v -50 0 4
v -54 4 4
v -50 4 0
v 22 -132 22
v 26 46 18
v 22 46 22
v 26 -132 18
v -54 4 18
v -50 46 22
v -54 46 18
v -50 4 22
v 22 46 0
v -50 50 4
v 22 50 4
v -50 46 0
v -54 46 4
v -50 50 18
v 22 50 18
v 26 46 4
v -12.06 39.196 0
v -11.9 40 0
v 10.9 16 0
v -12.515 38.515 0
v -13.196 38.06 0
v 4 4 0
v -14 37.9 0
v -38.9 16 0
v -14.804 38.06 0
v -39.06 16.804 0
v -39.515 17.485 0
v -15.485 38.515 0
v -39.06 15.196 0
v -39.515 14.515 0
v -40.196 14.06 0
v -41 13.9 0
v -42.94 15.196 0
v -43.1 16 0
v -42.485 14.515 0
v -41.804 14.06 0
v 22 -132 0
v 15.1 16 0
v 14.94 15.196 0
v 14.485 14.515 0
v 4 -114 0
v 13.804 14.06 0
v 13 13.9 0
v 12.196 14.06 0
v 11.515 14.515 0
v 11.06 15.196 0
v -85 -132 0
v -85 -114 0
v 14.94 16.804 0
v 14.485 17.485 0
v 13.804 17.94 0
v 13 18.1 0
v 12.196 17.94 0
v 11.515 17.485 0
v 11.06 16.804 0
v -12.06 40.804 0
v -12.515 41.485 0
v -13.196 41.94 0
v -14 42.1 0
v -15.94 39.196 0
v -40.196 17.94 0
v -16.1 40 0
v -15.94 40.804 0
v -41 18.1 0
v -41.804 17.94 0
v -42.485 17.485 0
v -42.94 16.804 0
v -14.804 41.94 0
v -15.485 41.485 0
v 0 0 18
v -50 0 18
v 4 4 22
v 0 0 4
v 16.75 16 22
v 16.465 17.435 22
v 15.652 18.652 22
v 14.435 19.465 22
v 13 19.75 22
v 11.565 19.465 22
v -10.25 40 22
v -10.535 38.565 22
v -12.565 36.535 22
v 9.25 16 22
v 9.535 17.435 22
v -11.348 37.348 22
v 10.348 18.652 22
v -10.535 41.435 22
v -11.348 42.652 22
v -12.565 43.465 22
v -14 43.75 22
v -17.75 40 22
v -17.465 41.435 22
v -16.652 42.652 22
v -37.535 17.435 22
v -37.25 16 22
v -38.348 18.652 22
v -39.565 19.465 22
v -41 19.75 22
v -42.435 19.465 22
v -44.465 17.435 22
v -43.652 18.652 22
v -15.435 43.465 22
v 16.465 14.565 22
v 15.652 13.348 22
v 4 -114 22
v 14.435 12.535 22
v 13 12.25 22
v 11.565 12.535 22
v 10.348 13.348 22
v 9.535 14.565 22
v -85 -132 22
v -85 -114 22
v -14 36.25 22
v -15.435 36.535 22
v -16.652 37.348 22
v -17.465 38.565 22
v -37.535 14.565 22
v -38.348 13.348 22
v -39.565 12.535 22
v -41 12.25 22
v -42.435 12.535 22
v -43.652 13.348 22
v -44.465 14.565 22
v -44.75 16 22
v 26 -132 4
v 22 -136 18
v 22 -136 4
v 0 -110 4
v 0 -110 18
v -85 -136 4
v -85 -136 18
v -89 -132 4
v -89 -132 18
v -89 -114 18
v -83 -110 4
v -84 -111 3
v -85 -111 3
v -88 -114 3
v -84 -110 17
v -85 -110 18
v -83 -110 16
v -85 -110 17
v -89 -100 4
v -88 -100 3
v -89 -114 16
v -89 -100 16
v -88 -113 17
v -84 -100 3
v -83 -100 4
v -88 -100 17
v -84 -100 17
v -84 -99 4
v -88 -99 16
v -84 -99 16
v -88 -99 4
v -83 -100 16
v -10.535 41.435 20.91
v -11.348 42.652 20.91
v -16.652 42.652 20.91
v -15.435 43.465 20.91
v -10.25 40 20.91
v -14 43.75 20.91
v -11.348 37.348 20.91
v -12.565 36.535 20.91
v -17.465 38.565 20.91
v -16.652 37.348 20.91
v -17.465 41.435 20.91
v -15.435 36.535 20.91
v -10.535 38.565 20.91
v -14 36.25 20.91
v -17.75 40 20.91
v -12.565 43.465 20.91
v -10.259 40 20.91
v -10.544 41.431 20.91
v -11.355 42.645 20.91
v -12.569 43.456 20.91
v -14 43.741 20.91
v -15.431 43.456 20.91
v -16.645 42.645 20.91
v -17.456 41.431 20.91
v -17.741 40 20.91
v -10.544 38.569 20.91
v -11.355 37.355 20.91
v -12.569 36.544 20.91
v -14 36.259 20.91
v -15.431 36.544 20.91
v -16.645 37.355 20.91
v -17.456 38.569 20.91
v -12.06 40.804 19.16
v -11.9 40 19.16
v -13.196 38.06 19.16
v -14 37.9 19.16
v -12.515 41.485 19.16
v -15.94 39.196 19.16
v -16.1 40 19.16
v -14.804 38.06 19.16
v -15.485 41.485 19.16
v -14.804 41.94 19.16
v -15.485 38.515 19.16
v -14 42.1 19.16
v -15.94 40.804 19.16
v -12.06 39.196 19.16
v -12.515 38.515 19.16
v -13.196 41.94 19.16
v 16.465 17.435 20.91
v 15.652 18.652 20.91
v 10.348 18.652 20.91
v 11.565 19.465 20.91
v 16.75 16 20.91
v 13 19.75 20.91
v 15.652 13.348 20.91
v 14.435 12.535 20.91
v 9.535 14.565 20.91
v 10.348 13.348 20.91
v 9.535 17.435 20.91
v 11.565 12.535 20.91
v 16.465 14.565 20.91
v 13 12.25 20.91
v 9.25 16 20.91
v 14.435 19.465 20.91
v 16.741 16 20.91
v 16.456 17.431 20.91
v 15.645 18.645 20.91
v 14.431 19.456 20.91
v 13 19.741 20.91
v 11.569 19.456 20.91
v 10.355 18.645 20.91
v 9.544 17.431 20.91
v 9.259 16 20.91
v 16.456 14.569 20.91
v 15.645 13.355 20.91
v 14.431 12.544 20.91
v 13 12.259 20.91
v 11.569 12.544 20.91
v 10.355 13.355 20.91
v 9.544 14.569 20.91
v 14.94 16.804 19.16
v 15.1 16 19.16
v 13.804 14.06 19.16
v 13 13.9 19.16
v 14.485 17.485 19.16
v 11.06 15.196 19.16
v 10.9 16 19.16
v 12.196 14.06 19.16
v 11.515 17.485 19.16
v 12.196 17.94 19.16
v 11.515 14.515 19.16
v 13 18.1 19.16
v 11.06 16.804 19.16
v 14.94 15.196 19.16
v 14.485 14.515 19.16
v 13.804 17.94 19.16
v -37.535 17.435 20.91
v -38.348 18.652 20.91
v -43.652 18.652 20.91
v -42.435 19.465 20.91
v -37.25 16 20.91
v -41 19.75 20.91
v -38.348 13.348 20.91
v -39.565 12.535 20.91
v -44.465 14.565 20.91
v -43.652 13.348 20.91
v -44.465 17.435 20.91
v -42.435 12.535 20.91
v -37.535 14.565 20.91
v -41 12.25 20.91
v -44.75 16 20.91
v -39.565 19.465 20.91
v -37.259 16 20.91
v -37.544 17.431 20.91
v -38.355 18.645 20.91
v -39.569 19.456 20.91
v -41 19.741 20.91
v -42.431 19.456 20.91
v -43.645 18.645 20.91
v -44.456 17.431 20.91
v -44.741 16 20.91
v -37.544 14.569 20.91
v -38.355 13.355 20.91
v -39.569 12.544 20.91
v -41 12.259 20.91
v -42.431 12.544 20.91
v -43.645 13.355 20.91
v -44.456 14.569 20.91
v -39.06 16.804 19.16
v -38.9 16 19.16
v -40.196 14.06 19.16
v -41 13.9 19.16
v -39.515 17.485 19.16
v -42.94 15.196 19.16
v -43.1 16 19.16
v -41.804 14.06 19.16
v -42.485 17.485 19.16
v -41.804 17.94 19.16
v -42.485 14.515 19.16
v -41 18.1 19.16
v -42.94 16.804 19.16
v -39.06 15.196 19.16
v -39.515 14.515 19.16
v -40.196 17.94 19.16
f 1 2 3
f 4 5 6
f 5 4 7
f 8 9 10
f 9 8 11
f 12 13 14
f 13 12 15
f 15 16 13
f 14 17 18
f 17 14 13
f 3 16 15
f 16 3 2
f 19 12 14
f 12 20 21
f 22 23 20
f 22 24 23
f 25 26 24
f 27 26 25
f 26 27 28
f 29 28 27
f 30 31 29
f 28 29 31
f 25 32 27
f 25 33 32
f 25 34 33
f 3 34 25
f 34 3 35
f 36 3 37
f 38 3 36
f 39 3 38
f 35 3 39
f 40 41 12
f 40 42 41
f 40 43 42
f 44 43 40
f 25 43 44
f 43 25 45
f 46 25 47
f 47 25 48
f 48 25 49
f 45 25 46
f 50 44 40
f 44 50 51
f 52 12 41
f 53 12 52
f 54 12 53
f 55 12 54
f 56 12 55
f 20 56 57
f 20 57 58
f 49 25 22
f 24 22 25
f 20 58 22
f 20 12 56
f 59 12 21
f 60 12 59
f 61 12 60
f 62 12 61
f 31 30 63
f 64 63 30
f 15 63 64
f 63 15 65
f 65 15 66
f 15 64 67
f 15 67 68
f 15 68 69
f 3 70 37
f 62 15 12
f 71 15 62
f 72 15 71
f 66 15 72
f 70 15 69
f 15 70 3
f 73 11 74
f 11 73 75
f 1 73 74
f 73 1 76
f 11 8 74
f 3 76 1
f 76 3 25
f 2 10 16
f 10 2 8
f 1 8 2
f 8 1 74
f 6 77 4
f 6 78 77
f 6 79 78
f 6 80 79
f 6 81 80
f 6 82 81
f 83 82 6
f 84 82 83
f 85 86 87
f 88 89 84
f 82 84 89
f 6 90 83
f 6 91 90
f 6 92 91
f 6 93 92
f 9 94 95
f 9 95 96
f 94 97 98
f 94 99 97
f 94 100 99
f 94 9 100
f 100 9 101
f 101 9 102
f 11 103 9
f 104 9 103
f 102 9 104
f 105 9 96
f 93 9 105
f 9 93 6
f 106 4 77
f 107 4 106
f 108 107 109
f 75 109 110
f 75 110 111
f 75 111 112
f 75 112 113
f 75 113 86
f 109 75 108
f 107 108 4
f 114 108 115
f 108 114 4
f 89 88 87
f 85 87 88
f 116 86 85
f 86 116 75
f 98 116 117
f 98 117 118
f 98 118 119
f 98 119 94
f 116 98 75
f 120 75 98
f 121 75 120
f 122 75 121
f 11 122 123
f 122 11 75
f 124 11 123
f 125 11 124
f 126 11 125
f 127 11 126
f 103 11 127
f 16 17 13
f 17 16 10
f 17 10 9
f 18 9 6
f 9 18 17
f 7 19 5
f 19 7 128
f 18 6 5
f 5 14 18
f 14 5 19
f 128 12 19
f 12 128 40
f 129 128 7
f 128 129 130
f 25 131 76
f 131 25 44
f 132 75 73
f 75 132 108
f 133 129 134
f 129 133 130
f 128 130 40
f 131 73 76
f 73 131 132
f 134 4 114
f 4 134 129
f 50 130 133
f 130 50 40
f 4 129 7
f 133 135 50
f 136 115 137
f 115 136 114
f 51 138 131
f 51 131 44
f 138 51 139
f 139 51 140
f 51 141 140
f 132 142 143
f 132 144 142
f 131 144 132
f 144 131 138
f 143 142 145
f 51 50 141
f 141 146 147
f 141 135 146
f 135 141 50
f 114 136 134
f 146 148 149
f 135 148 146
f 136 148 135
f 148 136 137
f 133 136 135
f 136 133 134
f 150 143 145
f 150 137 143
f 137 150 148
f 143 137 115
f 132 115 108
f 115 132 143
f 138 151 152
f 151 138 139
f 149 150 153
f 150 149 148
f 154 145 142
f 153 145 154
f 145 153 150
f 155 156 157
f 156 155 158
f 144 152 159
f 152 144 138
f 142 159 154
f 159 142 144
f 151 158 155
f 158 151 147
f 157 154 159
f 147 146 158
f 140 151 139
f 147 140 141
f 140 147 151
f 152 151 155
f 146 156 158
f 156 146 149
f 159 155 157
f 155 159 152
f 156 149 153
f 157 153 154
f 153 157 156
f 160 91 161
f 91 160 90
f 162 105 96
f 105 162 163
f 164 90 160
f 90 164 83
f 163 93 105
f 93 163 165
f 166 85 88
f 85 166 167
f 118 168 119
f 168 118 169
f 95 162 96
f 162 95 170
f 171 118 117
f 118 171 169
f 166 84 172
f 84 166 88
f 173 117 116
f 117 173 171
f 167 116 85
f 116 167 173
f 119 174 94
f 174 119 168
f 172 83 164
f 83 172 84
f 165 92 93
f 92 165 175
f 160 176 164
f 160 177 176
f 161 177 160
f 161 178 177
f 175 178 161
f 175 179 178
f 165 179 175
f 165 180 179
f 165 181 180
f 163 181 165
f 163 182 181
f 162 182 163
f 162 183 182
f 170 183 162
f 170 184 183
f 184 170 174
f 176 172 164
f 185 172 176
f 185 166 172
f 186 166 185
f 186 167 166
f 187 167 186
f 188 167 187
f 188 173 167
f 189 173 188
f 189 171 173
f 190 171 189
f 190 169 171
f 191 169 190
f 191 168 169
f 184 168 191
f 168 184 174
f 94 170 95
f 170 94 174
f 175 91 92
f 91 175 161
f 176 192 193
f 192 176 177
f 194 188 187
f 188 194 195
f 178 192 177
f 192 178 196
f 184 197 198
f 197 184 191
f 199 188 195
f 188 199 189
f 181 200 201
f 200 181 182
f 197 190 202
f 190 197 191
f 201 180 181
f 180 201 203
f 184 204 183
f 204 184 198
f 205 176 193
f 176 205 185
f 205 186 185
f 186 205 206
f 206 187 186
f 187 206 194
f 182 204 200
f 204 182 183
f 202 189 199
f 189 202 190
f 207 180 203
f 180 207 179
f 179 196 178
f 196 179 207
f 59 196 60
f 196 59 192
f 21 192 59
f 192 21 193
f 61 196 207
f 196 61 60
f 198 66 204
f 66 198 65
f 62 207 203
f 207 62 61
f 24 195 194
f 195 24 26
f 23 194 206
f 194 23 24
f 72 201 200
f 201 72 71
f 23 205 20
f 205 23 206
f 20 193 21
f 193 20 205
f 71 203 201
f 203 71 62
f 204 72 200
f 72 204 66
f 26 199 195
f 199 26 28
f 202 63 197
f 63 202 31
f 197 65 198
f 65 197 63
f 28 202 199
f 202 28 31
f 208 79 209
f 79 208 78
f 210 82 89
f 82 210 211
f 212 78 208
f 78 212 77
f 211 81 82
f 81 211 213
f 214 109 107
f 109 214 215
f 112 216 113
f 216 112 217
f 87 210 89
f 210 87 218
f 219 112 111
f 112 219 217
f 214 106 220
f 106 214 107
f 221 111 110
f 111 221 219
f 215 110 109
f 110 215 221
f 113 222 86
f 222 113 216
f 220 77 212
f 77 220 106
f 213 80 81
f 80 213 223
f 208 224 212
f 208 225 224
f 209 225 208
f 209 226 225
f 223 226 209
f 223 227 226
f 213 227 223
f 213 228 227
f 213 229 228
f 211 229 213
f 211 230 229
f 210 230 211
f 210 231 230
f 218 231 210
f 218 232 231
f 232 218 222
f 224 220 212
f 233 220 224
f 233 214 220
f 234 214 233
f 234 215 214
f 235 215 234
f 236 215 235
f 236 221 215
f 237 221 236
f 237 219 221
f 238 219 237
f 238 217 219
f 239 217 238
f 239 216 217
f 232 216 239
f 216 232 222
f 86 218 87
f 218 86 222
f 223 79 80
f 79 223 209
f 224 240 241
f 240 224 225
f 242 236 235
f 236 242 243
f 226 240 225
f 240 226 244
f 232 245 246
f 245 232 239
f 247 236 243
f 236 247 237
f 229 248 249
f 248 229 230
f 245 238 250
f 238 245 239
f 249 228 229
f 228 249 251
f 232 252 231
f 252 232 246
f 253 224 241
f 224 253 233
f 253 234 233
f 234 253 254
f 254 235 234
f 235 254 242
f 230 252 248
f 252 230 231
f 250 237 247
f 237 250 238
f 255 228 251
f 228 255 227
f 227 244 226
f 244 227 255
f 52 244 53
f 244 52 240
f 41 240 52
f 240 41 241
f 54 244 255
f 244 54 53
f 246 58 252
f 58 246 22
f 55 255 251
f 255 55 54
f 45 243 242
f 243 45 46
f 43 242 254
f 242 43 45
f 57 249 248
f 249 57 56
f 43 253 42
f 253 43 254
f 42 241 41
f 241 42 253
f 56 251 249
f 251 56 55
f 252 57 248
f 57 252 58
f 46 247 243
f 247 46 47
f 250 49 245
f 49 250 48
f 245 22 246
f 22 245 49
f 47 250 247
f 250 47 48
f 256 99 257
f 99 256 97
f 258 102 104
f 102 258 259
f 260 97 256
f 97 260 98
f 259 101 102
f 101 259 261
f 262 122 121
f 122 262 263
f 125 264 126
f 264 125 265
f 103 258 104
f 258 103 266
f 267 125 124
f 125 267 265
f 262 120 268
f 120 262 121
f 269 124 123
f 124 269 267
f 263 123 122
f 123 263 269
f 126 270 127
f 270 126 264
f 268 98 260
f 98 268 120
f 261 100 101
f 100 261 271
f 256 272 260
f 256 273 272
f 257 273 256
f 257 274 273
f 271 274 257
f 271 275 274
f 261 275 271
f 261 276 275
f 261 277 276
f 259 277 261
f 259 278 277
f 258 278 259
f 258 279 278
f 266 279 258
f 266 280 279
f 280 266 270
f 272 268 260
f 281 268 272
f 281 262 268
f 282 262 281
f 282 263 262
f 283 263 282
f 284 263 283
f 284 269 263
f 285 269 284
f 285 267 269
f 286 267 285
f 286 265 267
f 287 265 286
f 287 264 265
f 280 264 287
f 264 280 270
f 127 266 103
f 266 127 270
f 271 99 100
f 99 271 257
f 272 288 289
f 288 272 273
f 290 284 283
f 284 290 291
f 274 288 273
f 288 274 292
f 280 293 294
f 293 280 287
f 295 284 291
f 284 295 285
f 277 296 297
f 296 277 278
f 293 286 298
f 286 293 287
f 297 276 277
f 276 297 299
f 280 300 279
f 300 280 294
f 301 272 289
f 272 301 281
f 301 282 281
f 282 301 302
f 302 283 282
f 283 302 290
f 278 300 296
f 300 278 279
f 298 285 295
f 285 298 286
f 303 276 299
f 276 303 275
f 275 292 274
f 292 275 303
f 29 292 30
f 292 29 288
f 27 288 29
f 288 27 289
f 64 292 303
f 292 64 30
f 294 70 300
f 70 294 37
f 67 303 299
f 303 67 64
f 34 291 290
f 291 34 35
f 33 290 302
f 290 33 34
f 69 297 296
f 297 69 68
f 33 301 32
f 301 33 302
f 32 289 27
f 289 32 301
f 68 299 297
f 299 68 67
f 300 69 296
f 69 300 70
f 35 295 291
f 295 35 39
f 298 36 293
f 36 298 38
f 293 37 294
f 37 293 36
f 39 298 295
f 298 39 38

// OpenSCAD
base = [80, 50];
leg = [26, 110];
foot = [83, 26];
toe = [6, 7];

main_thickness = 22;

module octahedron(bevel) {
  for (a = [-1, 1])
  scale([1, 1, a])
  linear_extrude(bevel, scale=0)
  rotate([0, 0, 45])
  square(bevel*sqrt(2), center=true);
}

module block(xy, thickness=main_thickness, bevel=4) {
  hull()
  for (
    x = [bevel, xy.x-bevel],
    y = [bevel, xy.y-bevel],
    z = [bevel, thickness-bevel]
  )
  translate([x, y, z])
  octahedron(bevel);
}

module exterior() {
  translate([leg.x - base.x, 0, 0])
  block(base);
  
  translate([0, -leg.y - foot.y])
  block(leg + [0, base.y + foot.y]);
  
  translate([-foot.x - toe.x, -leg.y - foot.y])
  block(foot + [leg.x + toe.x, 0]);
  
  translate([-foot.x - toe.x, -leg.y - foot.y + 4, 3])
  block(toe + [0, foot.y], thickness=14, bevel=1);
}

module screw_hole() {
  $fn = 16;

  translate([0, 0, main_thickness + 0.01])
  scale([1, 1, -1]) {
    linear_extrude(1.1)
    circle(d=7.5);
    
    translate([0, 0, 1.1 - 0.01])
    linear_extrude(4, scale=0)
    circle(d=7.5);
    
    cylinder(h=30, d=4.2);
  }
}

module piece() {
  difference() {
    exterior();
    
    translate([leg.x - base.x/2, base.y-10])
    screw_hole();
    
    for (x = [leg.x/2, leg.x*1.5-base.x])
    translate([x, 16])
    screw_hole();
  }
}

piece();
